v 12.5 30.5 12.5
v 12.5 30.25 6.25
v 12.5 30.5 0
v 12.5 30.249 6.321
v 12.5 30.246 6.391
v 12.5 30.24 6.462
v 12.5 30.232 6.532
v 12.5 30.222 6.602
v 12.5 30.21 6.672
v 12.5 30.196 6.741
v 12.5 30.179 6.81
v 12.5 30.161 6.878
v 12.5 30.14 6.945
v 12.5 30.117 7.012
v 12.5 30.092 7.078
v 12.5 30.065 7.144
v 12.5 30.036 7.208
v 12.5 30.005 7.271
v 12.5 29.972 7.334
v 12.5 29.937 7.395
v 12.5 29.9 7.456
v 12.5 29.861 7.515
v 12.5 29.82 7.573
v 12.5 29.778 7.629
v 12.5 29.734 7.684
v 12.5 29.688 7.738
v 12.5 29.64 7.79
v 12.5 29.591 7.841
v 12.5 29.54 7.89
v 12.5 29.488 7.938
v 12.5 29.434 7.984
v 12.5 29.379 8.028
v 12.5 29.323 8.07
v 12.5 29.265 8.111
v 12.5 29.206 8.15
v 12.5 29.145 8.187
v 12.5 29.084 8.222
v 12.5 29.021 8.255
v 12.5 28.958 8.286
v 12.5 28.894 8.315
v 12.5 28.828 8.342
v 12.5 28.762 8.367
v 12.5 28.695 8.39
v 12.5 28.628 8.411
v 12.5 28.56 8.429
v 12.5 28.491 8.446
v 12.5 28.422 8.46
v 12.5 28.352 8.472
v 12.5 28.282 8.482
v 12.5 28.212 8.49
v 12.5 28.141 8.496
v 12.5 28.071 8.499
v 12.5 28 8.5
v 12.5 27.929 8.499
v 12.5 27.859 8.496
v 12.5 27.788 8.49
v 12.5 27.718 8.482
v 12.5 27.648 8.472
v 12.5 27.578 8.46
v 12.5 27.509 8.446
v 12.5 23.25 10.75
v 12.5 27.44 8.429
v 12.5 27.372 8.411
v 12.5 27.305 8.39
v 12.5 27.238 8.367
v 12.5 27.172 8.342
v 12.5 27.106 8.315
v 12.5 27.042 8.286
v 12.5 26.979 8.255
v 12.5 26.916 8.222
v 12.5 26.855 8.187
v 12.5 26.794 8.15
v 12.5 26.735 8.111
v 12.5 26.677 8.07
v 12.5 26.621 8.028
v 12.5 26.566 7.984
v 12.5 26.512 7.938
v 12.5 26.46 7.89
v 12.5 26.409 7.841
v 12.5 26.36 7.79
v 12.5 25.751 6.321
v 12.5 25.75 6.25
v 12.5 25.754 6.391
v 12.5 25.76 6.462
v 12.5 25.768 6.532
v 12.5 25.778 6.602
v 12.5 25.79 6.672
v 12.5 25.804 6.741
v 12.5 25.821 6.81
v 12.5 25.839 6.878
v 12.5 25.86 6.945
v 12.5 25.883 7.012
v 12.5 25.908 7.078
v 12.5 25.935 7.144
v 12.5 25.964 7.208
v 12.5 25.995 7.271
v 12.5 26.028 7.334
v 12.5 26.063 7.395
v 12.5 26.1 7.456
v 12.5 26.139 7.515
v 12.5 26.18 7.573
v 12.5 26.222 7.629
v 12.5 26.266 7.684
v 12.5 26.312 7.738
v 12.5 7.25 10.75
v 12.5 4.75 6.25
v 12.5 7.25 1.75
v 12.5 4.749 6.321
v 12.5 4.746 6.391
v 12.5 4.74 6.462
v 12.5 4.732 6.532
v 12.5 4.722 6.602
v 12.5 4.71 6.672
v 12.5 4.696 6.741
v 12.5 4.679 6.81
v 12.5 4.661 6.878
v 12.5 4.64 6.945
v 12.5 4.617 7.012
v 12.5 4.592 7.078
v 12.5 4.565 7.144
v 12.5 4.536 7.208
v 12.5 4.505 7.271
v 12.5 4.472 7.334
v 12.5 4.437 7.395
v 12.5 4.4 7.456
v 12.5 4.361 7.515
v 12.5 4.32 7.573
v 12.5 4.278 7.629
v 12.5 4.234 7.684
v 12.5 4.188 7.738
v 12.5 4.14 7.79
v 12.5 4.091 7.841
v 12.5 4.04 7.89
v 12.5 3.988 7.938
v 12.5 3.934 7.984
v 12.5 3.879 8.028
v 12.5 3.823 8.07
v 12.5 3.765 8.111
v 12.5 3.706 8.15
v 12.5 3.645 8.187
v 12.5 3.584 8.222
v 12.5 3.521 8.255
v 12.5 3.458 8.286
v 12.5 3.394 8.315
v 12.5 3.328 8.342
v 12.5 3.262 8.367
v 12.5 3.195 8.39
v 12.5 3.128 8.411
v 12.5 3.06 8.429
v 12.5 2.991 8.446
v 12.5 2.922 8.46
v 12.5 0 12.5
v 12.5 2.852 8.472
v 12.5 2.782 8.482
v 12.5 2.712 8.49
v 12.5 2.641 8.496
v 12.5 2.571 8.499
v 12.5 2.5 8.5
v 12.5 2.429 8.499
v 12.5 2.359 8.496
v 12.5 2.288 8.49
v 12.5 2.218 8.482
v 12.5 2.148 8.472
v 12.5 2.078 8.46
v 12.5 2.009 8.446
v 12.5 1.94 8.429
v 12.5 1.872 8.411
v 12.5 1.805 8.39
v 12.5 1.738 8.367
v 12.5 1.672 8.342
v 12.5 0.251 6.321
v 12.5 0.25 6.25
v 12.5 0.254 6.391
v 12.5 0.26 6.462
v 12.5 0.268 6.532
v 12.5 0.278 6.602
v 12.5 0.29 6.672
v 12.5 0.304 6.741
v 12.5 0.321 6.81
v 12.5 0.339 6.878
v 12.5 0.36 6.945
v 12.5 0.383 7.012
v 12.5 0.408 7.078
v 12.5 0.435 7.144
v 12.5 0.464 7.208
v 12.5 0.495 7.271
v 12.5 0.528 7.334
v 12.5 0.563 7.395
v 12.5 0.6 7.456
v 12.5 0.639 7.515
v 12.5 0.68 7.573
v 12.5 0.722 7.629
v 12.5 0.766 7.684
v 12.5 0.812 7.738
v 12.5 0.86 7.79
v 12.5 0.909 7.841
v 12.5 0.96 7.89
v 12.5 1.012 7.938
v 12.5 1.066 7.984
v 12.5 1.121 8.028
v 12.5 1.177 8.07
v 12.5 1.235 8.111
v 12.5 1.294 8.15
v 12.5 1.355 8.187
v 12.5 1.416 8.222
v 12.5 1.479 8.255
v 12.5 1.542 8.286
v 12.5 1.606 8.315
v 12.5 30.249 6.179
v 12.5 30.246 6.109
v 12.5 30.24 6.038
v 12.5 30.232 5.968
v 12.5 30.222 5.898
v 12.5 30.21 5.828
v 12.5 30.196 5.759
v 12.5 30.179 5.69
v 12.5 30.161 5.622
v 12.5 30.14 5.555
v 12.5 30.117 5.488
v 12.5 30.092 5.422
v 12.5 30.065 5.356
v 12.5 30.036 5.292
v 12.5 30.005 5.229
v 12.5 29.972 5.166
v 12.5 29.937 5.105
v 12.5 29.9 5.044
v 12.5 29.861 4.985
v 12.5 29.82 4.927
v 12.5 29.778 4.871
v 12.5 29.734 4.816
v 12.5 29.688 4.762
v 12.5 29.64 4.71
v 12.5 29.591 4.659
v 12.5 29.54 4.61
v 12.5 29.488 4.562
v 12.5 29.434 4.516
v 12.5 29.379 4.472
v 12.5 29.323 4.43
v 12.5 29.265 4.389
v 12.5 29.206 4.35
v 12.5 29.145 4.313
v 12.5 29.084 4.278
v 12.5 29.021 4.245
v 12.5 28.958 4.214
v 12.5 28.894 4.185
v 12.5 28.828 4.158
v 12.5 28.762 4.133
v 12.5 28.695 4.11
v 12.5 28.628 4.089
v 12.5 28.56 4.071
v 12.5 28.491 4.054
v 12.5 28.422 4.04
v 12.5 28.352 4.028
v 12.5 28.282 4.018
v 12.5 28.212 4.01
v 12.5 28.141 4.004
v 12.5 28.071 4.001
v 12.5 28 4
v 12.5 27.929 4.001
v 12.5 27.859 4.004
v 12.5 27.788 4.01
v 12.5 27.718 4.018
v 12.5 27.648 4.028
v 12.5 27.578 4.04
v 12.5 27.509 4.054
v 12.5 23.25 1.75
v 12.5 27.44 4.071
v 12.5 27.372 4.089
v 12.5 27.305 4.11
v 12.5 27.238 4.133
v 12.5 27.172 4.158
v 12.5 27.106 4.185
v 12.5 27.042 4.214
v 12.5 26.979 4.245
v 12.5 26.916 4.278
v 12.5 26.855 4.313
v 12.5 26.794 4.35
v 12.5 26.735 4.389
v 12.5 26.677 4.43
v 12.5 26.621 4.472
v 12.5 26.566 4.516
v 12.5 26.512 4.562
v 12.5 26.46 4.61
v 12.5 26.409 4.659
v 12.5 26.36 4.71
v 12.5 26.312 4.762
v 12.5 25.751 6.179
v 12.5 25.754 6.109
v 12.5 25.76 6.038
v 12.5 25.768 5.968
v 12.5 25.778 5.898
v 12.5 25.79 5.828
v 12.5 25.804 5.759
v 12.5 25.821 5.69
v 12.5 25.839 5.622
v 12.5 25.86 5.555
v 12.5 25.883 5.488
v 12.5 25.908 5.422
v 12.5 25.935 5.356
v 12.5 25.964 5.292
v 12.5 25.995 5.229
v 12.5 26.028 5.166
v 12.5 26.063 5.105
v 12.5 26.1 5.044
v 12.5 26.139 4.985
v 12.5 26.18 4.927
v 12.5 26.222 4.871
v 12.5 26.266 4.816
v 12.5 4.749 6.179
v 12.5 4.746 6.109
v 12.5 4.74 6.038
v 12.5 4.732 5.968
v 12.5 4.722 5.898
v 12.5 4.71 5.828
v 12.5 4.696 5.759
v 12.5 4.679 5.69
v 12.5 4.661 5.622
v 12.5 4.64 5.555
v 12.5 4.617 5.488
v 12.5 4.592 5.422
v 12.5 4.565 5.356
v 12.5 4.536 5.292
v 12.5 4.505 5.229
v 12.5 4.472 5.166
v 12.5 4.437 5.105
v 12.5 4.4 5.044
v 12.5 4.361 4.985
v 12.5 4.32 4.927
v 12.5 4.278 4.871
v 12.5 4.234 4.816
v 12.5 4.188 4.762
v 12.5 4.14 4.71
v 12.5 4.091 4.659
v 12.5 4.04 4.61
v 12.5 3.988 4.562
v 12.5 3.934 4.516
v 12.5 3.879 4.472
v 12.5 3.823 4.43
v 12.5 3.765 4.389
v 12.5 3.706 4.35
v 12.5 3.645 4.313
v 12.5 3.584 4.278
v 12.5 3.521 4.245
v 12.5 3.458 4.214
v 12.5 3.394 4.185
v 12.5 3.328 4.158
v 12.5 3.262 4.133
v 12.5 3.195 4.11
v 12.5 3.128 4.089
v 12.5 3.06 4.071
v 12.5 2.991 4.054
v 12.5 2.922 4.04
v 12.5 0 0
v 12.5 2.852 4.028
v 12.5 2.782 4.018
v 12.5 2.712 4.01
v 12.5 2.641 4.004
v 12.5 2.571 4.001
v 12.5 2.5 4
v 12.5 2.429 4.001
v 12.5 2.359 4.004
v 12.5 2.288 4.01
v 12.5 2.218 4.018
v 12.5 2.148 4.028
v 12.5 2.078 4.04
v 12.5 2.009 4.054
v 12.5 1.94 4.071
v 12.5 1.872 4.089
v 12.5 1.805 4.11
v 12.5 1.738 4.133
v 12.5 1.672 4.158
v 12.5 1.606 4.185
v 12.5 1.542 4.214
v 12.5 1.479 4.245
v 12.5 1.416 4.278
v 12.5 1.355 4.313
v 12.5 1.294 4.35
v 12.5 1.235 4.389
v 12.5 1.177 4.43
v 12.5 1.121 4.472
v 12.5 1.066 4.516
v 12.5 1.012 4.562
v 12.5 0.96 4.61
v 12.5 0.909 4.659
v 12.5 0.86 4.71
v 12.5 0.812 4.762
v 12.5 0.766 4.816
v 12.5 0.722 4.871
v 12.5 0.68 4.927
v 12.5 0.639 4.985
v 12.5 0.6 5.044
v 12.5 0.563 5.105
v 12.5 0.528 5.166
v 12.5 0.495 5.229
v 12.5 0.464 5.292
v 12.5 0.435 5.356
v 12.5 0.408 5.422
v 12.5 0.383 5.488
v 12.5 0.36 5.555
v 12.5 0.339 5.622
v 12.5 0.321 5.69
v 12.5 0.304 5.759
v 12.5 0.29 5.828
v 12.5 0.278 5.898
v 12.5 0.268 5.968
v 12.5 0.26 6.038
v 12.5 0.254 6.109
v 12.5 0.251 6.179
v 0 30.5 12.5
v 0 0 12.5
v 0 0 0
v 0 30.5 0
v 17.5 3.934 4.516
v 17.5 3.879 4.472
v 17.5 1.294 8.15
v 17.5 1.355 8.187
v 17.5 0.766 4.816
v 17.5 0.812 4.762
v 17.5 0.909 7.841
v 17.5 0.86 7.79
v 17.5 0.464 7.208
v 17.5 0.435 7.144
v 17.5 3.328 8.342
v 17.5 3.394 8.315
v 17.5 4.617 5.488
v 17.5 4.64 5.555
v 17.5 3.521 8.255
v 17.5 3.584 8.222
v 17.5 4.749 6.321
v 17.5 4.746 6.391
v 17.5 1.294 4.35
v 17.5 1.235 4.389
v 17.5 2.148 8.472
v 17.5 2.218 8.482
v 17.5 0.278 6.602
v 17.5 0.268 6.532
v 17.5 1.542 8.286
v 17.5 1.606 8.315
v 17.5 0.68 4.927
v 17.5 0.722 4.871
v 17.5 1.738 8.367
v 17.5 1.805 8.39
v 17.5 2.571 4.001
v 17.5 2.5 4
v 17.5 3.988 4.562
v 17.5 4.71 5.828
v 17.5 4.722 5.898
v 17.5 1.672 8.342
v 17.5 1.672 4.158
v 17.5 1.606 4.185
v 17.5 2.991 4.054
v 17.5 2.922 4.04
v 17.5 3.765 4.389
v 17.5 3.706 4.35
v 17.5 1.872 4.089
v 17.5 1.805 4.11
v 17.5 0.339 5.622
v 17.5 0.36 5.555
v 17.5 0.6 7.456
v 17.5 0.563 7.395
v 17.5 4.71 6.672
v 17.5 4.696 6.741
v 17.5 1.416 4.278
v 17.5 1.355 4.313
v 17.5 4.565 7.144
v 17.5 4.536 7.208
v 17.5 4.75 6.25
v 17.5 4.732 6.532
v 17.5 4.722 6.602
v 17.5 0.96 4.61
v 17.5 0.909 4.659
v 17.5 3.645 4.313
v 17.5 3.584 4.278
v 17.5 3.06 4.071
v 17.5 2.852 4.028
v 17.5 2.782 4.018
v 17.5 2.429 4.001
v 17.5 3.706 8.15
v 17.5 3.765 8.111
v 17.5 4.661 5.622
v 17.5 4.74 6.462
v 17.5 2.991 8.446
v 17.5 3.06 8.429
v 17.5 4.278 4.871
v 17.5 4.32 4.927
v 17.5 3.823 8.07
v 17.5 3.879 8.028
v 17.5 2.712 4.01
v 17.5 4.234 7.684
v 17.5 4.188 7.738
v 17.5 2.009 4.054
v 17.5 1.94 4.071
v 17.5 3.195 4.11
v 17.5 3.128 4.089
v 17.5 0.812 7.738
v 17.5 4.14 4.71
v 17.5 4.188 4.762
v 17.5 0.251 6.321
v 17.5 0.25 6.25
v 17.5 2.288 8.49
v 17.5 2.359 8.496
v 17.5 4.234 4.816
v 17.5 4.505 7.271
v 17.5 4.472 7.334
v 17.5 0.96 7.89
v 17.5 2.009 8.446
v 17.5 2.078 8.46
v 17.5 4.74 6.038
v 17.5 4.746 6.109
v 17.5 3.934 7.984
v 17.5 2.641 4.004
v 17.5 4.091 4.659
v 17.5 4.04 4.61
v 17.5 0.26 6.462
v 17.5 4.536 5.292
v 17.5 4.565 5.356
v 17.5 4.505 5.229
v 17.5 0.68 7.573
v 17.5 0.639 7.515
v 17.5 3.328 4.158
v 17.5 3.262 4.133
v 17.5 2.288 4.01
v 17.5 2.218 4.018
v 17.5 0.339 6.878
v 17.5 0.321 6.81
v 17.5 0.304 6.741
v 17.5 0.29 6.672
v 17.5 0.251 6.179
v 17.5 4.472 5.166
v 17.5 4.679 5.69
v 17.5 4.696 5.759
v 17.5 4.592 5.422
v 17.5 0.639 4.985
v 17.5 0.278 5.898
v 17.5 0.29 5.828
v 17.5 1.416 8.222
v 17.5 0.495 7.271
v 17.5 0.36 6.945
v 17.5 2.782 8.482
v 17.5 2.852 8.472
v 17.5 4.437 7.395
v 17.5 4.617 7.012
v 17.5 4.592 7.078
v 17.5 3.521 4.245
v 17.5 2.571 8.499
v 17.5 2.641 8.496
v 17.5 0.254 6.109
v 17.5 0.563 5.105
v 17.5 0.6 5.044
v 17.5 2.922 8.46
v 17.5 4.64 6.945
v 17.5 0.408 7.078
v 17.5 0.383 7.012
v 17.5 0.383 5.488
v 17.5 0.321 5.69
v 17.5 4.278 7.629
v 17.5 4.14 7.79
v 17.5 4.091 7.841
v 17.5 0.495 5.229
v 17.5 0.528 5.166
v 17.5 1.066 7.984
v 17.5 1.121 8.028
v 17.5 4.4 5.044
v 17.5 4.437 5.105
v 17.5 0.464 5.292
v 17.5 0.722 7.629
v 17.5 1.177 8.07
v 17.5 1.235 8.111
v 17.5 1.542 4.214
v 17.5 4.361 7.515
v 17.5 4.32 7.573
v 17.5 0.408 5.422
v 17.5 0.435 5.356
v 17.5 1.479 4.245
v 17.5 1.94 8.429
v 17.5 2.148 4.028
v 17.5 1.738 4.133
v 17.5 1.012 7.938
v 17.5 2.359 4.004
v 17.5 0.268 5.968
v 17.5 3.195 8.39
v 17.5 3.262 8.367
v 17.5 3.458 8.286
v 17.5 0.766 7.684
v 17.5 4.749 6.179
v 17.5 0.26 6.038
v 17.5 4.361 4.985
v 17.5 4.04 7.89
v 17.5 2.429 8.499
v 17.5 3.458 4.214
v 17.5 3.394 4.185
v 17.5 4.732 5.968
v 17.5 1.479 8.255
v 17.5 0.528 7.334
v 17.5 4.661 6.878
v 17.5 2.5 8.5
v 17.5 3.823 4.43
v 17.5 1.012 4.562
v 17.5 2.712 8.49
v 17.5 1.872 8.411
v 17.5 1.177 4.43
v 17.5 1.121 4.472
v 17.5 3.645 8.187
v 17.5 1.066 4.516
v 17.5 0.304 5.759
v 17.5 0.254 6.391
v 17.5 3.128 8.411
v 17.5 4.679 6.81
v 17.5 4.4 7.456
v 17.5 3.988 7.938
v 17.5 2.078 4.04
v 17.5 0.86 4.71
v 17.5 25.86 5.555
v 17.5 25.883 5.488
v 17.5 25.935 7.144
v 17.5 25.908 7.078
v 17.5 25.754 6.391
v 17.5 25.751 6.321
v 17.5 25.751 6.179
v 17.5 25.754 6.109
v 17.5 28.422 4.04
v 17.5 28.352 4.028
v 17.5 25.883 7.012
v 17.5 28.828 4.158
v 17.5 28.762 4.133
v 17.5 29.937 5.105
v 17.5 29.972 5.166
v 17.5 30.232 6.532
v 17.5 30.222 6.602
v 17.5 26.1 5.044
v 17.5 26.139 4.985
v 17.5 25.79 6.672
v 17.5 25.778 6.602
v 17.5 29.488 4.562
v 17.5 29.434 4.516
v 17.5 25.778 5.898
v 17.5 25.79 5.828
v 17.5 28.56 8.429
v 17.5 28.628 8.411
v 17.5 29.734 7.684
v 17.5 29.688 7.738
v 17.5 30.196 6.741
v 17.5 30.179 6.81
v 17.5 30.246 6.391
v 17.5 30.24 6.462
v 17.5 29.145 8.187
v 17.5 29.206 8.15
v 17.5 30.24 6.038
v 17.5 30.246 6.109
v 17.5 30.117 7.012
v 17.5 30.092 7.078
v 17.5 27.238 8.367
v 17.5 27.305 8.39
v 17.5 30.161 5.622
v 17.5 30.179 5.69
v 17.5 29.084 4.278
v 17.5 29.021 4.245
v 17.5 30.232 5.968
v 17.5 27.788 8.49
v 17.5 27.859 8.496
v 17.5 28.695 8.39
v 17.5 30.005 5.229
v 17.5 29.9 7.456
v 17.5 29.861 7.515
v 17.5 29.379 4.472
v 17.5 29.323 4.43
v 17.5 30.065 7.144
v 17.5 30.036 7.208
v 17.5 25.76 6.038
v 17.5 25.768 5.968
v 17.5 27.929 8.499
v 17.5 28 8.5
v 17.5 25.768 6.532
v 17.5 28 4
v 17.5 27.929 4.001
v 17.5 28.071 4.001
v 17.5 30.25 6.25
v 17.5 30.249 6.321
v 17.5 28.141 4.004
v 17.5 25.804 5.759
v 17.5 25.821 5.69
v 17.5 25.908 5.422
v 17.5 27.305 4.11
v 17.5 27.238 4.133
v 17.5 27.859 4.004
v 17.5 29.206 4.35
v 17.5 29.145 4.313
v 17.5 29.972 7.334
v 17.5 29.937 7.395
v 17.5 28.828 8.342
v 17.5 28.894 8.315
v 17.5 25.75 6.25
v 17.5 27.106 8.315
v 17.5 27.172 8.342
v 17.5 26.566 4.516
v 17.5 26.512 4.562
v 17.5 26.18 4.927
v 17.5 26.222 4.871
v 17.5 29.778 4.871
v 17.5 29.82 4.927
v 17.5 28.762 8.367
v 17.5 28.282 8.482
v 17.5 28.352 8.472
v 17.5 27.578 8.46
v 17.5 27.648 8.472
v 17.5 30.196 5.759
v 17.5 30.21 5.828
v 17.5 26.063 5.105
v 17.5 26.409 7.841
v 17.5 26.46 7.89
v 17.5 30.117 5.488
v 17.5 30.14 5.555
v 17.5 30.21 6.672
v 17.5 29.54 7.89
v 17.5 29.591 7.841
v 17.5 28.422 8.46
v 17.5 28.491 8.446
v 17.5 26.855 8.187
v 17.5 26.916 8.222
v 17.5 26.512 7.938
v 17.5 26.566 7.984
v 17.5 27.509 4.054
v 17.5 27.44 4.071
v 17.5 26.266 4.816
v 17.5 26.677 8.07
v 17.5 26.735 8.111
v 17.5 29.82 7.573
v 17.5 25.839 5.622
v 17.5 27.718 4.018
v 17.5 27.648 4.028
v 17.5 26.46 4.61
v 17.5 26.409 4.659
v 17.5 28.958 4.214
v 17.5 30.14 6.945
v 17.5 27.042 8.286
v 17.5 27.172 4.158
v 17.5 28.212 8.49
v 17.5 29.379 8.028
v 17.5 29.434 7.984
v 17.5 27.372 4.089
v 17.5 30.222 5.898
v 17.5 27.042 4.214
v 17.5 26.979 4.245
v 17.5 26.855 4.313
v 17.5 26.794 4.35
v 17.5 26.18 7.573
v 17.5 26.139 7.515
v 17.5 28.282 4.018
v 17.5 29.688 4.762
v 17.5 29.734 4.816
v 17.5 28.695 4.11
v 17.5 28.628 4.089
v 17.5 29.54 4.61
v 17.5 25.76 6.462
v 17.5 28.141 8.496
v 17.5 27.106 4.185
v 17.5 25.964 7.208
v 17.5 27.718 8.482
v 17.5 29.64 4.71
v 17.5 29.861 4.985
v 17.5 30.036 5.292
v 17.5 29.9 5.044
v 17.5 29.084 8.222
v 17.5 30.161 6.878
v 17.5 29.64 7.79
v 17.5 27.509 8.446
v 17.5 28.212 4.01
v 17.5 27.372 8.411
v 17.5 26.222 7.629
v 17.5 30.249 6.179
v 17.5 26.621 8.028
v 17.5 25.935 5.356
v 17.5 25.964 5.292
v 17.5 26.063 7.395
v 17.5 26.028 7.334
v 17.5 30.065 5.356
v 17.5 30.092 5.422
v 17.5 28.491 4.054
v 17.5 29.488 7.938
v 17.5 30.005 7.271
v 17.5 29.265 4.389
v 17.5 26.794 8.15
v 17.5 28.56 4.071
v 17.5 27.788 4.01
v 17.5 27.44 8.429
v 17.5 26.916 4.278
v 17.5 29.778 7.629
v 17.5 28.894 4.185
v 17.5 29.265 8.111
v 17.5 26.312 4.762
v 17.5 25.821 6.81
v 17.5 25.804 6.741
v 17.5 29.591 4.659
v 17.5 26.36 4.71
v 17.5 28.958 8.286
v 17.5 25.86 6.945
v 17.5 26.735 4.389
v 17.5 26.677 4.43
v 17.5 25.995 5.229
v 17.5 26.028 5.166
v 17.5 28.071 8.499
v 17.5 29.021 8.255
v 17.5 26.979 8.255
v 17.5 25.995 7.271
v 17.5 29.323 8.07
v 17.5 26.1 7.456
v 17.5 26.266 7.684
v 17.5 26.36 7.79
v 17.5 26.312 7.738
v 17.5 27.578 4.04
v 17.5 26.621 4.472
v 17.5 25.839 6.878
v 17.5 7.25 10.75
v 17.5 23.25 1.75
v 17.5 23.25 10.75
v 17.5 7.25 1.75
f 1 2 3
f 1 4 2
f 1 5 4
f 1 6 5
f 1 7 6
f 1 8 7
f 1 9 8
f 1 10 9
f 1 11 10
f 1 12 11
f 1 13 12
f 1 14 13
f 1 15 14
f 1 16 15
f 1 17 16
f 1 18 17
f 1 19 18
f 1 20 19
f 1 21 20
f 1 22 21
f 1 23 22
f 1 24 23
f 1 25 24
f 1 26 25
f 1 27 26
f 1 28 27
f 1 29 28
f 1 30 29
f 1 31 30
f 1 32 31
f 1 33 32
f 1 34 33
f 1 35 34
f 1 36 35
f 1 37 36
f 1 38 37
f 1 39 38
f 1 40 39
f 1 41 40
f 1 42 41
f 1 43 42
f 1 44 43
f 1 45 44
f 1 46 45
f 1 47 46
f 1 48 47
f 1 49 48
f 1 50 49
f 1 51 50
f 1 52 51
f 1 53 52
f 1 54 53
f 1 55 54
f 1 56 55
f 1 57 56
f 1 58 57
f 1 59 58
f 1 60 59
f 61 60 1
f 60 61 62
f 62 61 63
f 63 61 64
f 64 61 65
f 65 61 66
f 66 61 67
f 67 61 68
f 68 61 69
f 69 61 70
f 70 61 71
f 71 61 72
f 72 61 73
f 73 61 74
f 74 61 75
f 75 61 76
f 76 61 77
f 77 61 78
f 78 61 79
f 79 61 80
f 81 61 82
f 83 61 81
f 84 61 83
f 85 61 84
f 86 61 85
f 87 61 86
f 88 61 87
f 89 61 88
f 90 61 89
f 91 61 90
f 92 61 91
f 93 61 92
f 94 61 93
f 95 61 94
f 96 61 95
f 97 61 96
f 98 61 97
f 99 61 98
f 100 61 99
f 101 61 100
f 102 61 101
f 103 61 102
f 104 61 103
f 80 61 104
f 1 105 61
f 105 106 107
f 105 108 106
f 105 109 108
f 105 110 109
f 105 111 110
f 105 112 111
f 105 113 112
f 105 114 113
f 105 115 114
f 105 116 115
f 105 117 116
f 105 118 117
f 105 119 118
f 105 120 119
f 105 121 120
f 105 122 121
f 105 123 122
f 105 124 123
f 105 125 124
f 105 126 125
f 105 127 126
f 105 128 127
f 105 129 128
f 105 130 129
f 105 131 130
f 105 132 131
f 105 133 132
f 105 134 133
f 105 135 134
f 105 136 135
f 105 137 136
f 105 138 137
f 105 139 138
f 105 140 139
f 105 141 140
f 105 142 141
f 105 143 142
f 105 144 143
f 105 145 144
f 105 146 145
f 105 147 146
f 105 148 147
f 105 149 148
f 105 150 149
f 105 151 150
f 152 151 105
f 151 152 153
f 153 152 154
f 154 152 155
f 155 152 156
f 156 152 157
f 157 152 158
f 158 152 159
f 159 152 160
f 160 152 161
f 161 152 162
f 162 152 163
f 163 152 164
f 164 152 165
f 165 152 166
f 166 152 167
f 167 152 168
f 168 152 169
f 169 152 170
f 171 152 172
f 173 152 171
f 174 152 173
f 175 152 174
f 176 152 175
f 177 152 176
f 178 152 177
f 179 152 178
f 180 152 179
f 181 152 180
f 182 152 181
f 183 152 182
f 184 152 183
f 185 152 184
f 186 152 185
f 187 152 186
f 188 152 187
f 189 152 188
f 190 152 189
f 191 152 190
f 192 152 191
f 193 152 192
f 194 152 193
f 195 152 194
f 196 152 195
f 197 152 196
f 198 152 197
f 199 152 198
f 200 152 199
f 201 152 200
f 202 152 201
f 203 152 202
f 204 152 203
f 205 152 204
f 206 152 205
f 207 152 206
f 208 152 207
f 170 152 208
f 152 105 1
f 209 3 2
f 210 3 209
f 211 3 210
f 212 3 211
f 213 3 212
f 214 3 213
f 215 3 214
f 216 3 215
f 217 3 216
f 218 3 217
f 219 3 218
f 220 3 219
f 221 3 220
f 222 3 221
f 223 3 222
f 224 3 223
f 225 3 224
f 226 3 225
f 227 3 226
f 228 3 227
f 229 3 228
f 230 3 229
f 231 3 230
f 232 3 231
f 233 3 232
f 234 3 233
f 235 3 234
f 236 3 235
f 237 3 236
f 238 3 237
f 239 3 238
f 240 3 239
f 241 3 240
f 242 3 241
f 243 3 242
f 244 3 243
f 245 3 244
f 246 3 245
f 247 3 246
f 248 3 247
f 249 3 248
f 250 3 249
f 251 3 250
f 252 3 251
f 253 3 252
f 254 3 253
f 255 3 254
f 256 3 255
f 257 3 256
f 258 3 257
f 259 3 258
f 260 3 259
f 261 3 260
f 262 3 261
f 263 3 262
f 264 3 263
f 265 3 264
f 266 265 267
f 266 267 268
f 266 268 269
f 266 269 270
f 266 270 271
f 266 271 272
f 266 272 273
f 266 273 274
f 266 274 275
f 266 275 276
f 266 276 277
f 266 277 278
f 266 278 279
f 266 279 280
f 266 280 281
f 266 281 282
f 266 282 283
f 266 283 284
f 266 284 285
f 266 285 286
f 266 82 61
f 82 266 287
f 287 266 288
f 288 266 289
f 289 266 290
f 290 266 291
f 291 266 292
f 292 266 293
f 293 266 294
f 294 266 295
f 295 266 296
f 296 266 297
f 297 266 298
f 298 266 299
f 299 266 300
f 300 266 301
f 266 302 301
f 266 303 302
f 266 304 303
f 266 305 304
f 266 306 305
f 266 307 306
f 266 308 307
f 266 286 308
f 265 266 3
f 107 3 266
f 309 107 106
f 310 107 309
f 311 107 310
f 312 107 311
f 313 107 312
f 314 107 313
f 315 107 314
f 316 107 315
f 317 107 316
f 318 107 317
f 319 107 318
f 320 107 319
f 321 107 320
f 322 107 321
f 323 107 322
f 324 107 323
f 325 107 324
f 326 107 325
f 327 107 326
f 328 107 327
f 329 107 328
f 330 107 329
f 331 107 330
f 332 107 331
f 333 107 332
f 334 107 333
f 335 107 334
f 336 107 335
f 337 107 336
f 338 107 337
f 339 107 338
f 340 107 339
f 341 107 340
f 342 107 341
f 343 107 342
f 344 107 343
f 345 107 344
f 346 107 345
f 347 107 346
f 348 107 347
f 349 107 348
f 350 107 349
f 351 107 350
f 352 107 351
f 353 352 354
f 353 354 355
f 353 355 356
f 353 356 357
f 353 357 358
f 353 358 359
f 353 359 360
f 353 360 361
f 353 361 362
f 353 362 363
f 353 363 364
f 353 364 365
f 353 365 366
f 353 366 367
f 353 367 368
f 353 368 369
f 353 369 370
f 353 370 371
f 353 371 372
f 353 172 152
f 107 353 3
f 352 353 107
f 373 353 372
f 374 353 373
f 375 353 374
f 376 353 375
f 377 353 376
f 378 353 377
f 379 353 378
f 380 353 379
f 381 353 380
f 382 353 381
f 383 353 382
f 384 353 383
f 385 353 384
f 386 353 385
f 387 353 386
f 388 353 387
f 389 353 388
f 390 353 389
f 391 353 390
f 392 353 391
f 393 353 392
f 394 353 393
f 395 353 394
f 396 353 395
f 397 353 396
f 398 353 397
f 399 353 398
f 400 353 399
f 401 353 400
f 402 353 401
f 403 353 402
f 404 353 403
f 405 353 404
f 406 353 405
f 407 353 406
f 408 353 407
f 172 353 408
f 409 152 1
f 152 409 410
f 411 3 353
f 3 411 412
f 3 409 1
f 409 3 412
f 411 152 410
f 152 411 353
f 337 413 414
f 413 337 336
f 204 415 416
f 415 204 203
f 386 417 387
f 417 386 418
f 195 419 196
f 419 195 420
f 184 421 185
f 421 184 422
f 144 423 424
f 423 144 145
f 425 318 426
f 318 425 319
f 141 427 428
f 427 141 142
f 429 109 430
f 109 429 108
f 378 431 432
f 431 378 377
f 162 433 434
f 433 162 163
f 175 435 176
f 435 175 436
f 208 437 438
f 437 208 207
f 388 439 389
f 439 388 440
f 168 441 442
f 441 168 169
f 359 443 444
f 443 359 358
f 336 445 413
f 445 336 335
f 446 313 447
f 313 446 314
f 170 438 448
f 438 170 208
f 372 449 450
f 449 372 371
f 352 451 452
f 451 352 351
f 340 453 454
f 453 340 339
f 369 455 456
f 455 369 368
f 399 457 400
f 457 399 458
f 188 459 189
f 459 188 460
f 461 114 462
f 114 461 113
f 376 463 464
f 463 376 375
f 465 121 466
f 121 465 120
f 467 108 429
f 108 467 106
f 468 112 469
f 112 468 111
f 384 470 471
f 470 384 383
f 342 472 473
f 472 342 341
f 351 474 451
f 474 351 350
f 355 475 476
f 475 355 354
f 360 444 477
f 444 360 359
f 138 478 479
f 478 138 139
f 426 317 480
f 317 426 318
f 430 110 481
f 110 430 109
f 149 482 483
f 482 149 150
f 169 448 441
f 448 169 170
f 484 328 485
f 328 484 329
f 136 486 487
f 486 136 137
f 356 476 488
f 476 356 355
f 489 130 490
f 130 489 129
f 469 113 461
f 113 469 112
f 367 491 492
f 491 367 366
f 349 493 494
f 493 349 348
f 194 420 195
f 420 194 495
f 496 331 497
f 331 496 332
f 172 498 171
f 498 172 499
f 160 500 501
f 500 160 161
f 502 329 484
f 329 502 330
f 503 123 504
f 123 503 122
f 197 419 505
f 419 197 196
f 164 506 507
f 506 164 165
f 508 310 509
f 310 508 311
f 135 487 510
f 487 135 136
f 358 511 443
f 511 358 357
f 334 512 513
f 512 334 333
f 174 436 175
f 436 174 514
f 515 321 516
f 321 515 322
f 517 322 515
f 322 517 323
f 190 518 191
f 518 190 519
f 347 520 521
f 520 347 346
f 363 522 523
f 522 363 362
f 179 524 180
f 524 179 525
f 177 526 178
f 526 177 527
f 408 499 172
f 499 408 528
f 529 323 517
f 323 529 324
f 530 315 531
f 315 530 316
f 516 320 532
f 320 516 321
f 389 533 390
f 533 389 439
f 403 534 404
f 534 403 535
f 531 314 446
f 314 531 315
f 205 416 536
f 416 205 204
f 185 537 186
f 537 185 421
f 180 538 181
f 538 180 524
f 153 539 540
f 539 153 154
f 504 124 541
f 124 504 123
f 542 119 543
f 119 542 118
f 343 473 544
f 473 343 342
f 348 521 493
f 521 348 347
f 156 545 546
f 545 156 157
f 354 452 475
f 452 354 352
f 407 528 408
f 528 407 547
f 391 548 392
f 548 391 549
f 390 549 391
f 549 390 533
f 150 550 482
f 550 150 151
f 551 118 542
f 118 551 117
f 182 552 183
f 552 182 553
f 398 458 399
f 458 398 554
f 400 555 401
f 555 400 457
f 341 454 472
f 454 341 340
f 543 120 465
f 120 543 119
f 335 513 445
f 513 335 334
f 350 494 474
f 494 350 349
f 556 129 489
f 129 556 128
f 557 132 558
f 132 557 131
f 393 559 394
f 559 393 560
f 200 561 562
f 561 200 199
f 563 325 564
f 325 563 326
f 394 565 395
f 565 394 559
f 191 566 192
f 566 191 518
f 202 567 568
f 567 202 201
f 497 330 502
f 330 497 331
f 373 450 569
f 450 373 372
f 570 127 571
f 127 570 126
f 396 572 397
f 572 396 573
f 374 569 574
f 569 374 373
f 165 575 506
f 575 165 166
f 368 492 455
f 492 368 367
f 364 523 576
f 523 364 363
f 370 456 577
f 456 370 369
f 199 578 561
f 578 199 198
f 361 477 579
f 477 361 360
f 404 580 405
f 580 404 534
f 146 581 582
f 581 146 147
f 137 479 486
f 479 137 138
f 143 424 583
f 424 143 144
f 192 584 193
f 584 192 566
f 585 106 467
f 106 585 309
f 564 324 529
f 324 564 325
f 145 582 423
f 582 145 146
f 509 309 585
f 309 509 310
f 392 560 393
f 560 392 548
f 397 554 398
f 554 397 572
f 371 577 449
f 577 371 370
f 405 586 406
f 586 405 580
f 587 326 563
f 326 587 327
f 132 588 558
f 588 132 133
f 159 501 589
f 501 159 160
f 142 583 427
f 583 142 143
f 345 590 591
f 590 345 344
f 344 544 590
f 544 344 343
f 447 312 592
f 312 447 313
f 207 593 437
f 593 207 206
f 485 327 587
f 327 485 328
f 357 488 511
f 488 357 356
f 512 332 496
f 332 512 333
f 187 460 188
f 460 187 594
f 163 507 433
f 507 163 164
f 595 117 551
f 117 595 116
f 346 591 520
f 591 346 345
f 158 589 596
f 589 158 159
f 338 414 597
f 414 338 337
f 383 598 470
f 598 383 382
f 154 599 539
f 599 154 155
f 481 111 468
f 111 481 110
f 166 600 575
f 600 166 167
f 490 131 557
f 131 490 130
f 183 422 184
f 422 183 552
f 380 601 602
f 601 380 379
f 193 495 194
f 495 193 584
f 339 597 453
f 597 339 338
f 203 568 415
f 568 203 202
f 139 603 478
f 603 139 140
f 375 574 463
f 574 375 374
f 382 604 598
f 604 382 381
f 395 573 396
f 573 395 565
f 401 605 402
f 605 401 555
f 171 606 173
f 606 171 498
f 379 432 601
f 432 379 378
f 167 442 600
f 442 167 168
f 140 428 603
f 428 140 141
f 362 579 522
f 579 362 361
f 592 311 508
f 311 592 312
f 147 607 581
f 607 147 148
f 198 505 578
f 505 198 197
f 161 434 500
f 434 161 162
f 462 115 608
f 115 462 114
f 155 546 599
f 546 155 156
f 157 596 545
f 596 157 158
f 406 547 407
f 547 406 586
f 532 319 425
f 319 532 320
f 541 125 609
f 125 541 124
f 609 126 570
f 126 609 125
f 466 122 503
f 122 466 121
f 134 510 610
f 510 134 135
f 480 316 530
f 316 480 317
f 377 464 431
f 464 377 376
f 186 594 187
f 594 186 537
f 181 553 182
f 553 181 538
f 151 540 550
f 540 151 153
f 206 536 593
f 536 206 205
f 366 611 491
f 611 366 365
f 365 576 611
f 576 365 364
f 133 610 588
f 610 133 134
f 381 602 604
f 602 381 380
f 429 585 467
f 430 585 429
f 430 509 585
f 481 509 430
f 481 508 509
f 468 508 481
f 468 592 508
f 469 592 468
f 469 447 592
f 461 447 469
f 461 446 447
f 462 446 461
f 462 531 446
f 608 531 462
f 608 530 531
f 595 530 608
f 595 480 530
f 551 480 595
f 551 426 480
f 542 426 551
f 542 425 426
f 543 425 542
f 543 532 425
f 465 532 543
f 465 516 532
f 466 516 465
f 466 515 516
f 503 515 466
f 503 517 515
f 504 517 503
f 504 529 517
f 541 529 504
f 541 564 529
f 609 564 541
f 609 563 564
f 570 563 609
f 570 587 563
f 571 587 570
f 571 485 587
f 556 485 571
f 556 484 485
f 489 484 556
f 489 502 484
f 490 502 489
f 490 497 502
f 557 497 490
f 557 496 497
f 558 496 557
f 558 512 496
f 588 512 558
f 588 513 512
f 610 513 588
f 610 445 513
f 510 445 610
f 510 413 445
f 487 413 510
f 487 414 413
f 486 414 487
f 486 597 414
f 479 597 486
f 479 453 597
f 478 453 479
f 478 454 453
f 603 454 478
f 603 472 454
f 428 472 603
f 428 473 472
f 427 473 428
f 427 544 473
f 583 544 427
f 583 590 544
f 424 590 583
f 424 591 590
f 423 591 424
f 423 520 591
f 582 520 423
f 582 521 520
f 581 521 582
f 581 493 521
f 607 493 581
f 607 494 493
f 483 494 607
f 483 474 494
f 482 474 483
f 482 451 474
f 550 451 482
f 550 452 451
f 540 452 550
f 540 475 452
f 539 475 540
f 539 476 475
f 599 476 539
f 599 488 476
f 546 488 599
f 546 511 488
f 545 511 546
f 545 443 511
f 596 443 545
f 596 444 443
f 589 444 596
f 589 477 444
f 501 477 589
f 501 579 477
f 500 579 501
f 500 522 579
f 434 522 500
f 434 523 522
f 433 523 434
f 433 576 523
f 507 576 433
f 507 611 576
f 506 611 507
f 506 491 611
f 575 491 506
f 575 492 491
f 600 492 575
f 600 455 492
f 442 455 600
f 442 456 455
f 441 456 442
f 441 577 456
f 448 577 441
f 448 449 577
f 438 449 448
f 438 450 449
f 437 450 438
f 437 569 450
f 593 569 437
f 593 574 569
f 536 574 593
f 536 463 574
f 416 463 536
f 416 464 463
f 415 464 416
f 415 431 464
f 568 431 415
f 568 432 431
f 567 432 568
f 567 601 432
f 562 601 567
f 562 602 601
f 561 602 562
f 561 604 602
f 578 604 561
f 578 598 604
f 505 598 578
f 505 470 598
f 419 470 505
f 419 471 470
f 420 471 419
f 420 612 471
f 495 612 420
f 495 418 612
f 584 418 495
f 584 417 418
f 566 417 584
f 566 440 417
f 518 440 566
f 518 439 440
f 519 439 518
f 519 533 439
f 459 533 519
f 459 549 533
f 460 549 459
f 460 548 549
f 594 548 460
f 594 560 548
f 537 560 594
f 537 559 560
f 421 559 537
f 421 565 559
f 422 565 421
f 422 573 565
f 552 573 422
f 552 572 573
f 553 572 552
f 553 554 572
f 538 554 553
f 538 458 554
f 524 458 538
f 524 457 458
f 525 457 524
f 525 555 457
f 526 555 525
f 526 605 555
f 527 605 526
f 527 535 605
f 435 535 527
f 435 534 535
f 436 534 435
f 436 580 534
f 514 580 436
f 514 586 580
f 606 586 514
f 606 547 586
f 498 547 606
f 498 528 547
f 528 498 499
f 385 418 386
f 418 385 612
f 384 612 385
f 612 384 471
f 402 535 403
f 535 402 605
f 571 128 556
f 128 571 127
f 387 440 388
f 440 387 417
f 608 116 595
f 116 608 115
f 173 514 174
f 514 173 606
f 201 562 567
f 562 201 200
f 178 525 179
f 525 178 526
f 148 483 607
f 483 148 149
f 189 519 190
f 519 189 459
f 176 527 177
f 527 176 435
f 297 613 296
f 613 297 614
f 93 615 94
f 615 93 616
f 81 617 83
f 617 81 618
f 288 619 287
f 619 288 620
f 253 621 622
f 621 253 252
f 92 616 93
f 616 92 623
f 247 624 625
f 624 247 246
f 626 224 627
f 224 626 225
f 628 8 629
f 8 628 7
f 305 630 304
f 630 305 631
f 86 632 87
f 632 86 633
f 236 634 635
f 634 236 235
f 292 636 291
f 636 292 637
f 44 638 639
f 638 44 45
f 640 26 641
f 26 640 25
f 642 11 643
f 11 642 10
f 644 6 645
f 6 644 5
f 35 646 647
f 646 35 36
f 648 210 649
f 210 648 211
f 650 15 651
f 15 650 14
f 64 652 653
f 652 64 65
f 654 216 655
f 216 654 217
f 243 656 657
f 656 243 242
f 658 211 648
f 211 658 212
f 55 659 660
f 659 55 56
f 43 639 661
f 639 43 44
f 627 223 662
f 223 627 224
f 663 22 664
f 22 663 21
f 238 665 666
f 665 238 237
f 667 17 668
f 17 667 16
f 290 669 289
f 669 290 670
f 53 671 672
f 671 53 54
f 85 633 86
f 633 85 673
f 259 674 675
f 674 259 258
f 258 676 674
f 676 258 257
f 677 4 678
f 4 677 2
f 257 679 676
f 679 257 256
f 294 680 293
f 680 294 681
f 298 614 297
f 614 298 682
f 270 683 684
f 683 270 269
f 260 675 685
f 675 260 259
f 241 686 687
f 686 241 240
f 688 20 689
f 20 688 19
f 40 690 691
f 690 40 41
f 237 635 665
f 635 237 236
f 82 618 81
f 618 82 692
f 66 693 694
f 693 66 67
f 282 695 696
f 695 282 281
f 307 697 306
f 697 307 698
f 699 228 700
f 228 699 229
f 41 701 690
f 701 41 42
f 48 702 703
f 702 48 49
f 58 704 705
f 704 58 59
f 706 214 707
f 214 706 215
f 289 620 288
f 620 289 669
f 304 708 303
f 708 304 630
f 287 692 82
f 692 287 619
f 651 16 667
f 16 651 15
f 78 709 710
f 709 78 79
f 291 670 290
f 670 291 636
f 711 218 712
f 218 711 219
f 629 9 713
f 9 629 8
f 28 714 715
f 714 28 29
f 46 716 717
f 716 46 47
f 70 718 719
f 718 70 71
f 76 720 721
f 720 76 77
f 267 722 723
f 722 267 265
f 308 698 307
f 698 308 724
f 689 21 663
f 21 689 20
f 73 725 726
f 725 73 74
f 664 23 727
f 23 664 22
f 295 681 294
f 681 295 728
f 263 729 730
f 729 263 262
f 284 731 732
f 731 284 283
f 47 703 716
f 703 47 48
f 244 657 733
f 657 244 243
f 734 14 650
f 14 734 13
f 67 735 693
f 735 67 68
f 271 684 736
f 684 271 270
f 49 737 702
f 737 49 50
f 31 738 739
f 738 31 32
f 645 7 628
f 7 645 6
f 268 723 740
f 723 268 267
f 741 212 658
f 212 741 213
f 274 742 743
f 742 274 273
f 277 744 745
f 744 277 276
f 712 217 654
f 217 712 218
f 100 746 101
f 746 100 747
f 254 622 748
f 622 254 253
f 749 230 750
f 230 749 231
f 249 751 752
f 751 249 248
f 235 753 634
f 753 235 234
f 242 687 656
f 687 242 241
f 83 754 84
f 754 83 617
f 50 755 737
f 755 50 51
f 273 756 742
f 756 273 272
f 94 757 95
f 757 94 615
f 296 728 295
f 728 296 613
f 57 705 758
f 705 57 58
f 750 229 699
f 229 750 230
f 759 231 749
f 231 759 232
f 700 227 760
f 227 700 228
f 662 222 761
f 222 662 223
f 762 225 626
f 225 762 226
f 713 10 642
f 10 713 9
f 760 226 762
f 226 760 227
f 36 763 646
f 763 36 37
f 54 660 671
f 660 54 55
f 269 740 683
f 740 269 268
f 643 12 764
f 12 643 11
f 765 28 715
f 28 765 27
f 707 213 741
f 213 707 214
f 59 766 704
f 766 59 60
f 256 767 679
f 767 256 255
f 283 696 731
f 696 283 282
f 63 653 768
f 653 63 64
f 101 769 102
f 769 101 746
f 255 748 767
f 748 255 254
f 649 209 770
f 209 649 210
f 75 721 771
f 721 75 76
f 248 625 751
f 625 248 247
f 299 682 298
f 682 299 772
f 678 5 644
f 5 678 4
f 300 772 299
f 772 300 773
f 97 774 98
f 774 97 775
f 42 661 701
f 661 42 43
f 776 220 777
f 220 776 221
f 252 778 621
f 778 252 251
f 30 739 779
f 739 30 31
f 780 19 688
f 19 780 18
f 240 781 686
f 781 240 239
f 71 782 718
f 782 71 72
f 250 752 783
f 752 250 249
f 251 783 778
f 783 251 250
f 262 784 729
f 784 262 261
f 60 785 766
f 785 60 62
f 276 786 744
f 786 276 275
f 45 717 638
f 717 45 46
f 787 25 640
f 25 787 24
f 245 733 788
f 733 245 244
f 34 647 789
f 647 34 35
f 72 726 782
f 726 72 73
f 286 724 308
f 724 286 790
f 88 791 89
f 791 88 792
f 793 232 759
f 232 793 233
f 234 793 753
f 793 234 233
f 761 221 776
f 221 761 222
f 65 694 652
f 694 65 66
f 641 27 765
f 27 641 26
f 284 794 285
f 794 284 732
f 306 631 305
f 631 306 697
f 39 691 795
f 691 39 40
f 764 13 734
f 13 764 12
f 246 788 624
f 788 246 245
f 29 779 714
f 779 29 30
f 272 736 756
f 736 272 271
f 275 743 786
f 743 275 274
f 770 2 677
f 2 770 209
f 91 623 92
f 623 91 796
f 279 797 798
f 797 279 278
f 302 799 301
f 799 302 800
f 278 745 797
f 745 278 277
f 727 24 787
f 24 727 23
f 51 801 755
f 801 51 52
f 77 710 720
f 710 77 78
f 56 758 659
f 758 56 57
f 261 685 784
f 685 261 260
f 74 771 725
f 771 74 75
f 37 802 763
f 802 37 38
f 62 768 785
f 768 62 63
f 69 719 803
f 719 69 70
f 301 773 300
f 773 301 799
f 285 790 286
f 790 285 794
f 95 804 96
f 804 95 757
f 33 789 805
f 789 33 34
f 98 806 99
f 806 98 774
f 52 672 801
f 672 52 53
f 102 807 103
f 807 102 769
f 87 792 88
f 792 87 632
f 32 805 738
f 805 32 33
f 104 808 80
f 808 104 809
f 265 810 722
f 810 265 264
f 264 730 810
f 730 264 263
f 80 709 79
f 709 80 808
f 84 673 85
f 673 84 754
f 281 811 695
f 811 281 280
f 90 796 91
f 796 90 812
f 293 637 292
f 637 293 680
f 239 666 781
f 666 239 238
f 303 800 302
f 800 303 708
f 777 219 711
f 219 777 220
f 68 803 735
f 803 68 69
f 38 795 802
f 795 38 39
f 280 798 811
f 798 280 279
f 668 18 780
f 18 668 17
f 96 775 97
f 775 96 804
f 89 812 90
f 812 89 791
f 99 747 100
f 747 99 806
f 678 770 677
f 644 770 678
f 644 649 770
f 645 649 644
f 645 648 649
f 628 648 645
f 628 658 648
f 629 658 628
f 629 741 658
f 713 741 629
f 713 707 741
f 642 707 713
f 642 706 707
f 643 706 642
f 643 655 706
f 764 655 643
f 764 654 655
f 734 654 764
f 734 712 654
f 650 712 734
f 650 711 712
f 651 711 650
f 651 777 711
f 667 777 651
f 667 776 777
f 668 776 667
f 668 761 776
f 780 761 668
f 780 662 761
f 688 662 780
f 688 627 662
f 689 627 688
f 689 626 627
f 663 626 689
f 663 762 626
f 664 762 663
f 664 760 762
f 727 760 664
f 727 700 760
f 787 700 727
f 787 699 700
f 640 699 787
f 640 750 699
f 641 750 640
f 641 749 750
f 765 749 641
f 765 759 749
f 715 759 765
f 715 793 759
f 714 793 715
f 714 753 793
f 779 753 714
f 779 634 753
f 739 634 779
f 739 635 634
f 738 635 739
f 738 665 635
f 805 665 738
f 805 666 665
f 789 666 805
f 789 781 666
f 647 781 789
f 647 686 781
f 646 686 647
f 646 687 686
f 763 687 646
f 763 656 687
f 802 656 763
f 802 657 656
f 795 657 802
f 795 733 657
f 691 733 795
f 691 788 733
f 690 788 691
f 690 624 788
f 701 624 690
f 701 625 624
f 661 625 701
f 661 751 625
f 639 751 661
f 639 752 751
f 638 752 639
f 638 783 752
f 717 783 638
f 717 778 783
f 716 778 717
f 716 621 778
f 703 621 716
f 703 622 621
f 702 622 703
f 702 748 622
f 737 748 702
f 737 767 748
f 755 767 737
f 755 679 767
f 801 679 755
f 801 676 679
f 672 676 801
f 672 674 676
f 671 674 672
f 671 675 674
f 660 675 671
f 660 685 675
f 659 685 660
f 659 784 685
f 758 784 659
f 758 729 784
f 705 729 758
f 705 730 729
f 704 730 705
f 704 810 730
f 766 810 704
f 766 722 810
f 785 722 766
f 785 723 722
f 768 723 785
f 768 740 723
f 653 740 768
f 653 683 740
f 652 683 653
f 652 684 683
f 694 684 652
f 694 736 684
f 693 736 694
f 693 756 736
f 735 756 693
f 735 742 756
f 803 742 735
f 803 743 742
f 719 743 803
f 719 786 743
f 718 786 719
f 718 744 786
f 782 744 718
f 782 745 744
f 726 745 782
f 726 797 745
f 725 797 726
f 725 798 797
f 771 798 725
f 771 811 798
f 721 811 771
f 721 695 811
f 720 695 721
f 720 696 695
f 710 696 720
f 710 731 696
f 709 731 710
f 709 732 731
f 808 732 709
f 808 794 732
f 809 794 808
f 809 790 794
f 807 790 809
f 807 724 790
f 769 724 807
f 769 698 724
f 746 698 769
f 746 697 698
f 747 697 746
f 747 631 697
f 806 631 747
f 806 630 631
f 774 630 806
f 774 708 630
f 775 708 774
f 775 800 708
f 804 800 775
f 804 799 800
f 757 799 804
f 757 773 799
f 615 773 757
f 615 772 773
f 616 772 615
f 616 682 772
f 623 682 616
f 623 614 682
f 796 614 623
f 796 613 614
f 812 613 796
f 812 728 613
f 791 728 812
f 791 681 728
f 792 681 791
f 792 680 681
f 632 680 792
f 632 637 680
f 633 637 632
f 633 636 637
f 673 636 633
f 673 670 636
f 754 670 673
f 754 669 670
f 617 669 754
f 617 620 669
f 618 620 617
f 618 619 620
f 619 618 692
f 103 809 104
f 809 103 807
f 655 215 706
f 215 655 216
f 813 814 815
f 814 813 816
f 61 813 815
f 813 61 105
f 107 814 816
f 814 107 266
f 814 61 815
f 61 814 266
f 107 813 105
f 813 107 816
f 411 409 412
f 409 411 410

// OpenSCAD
// file: ../config.scad
$fn = 200;
nothing = 0.01;

/*
 * CANtact PCB properties
 */
pcb_x = 61;
pcb_y = 36;
pcb_thickness = 1;
pcb_bottom_layer_parts_height = 3;
pcb_top_layer_parts_height = 12;

pcb_hole1_x = 25.5;
pcb_hole1_y = 4;

pcb_hole2_x = 57.5;
pcb_hole2_y = 28;

/*
 * Case properties
 */
wall_thickness = 2.5;
screw_terminal_outer_diameter = 6;
screw_terminal_inner_diameter = 1.5;

/*
 * How much to increase x and y,
 * respectively width and length
 * compared to the PCB size
 */
expansion_x = 1;
expansion_y = 1;
expansion_z = 0;
// main file
include <../config.scad>;

module dsub9()
{
    body_x = 12.5;
    body_y = 30.5;
    body_z = 12.5;

    connector_x = 5;
    connector_y = 16;
    connector_z = 9;

    // Black plastic body
    color("black")
    cube([
        body_x - 0.5,
        body_y,
        body_z
        ]);

    color("lightgrey")
    {
        // Metal plate
        translate([body_x - 0.5, 0, 0])
        cube([
            0.5,
            body_y,
            body_z
            ]);

        // Left screw terminal
        translate([body_x, 2.5, body_z/2])
        rotate([0, 90, 0])
        cylinder(r=4.5/2, h=5);

        // Right screw terminal
        translate([body_x, body_y-2.5, body_z/2])
        rotate([0, 90, 0])
        cylinder(r=4.5/2, h=5);

        // 9-pin connector
        translate([
            body_x,
            body_y/2 - connector_y/2,
            body_z/2 - connector_z/2
            ])
        cube([
            connector_x,
            connector_y,
            connector_z
            ]);
    }
}

dsub9();
